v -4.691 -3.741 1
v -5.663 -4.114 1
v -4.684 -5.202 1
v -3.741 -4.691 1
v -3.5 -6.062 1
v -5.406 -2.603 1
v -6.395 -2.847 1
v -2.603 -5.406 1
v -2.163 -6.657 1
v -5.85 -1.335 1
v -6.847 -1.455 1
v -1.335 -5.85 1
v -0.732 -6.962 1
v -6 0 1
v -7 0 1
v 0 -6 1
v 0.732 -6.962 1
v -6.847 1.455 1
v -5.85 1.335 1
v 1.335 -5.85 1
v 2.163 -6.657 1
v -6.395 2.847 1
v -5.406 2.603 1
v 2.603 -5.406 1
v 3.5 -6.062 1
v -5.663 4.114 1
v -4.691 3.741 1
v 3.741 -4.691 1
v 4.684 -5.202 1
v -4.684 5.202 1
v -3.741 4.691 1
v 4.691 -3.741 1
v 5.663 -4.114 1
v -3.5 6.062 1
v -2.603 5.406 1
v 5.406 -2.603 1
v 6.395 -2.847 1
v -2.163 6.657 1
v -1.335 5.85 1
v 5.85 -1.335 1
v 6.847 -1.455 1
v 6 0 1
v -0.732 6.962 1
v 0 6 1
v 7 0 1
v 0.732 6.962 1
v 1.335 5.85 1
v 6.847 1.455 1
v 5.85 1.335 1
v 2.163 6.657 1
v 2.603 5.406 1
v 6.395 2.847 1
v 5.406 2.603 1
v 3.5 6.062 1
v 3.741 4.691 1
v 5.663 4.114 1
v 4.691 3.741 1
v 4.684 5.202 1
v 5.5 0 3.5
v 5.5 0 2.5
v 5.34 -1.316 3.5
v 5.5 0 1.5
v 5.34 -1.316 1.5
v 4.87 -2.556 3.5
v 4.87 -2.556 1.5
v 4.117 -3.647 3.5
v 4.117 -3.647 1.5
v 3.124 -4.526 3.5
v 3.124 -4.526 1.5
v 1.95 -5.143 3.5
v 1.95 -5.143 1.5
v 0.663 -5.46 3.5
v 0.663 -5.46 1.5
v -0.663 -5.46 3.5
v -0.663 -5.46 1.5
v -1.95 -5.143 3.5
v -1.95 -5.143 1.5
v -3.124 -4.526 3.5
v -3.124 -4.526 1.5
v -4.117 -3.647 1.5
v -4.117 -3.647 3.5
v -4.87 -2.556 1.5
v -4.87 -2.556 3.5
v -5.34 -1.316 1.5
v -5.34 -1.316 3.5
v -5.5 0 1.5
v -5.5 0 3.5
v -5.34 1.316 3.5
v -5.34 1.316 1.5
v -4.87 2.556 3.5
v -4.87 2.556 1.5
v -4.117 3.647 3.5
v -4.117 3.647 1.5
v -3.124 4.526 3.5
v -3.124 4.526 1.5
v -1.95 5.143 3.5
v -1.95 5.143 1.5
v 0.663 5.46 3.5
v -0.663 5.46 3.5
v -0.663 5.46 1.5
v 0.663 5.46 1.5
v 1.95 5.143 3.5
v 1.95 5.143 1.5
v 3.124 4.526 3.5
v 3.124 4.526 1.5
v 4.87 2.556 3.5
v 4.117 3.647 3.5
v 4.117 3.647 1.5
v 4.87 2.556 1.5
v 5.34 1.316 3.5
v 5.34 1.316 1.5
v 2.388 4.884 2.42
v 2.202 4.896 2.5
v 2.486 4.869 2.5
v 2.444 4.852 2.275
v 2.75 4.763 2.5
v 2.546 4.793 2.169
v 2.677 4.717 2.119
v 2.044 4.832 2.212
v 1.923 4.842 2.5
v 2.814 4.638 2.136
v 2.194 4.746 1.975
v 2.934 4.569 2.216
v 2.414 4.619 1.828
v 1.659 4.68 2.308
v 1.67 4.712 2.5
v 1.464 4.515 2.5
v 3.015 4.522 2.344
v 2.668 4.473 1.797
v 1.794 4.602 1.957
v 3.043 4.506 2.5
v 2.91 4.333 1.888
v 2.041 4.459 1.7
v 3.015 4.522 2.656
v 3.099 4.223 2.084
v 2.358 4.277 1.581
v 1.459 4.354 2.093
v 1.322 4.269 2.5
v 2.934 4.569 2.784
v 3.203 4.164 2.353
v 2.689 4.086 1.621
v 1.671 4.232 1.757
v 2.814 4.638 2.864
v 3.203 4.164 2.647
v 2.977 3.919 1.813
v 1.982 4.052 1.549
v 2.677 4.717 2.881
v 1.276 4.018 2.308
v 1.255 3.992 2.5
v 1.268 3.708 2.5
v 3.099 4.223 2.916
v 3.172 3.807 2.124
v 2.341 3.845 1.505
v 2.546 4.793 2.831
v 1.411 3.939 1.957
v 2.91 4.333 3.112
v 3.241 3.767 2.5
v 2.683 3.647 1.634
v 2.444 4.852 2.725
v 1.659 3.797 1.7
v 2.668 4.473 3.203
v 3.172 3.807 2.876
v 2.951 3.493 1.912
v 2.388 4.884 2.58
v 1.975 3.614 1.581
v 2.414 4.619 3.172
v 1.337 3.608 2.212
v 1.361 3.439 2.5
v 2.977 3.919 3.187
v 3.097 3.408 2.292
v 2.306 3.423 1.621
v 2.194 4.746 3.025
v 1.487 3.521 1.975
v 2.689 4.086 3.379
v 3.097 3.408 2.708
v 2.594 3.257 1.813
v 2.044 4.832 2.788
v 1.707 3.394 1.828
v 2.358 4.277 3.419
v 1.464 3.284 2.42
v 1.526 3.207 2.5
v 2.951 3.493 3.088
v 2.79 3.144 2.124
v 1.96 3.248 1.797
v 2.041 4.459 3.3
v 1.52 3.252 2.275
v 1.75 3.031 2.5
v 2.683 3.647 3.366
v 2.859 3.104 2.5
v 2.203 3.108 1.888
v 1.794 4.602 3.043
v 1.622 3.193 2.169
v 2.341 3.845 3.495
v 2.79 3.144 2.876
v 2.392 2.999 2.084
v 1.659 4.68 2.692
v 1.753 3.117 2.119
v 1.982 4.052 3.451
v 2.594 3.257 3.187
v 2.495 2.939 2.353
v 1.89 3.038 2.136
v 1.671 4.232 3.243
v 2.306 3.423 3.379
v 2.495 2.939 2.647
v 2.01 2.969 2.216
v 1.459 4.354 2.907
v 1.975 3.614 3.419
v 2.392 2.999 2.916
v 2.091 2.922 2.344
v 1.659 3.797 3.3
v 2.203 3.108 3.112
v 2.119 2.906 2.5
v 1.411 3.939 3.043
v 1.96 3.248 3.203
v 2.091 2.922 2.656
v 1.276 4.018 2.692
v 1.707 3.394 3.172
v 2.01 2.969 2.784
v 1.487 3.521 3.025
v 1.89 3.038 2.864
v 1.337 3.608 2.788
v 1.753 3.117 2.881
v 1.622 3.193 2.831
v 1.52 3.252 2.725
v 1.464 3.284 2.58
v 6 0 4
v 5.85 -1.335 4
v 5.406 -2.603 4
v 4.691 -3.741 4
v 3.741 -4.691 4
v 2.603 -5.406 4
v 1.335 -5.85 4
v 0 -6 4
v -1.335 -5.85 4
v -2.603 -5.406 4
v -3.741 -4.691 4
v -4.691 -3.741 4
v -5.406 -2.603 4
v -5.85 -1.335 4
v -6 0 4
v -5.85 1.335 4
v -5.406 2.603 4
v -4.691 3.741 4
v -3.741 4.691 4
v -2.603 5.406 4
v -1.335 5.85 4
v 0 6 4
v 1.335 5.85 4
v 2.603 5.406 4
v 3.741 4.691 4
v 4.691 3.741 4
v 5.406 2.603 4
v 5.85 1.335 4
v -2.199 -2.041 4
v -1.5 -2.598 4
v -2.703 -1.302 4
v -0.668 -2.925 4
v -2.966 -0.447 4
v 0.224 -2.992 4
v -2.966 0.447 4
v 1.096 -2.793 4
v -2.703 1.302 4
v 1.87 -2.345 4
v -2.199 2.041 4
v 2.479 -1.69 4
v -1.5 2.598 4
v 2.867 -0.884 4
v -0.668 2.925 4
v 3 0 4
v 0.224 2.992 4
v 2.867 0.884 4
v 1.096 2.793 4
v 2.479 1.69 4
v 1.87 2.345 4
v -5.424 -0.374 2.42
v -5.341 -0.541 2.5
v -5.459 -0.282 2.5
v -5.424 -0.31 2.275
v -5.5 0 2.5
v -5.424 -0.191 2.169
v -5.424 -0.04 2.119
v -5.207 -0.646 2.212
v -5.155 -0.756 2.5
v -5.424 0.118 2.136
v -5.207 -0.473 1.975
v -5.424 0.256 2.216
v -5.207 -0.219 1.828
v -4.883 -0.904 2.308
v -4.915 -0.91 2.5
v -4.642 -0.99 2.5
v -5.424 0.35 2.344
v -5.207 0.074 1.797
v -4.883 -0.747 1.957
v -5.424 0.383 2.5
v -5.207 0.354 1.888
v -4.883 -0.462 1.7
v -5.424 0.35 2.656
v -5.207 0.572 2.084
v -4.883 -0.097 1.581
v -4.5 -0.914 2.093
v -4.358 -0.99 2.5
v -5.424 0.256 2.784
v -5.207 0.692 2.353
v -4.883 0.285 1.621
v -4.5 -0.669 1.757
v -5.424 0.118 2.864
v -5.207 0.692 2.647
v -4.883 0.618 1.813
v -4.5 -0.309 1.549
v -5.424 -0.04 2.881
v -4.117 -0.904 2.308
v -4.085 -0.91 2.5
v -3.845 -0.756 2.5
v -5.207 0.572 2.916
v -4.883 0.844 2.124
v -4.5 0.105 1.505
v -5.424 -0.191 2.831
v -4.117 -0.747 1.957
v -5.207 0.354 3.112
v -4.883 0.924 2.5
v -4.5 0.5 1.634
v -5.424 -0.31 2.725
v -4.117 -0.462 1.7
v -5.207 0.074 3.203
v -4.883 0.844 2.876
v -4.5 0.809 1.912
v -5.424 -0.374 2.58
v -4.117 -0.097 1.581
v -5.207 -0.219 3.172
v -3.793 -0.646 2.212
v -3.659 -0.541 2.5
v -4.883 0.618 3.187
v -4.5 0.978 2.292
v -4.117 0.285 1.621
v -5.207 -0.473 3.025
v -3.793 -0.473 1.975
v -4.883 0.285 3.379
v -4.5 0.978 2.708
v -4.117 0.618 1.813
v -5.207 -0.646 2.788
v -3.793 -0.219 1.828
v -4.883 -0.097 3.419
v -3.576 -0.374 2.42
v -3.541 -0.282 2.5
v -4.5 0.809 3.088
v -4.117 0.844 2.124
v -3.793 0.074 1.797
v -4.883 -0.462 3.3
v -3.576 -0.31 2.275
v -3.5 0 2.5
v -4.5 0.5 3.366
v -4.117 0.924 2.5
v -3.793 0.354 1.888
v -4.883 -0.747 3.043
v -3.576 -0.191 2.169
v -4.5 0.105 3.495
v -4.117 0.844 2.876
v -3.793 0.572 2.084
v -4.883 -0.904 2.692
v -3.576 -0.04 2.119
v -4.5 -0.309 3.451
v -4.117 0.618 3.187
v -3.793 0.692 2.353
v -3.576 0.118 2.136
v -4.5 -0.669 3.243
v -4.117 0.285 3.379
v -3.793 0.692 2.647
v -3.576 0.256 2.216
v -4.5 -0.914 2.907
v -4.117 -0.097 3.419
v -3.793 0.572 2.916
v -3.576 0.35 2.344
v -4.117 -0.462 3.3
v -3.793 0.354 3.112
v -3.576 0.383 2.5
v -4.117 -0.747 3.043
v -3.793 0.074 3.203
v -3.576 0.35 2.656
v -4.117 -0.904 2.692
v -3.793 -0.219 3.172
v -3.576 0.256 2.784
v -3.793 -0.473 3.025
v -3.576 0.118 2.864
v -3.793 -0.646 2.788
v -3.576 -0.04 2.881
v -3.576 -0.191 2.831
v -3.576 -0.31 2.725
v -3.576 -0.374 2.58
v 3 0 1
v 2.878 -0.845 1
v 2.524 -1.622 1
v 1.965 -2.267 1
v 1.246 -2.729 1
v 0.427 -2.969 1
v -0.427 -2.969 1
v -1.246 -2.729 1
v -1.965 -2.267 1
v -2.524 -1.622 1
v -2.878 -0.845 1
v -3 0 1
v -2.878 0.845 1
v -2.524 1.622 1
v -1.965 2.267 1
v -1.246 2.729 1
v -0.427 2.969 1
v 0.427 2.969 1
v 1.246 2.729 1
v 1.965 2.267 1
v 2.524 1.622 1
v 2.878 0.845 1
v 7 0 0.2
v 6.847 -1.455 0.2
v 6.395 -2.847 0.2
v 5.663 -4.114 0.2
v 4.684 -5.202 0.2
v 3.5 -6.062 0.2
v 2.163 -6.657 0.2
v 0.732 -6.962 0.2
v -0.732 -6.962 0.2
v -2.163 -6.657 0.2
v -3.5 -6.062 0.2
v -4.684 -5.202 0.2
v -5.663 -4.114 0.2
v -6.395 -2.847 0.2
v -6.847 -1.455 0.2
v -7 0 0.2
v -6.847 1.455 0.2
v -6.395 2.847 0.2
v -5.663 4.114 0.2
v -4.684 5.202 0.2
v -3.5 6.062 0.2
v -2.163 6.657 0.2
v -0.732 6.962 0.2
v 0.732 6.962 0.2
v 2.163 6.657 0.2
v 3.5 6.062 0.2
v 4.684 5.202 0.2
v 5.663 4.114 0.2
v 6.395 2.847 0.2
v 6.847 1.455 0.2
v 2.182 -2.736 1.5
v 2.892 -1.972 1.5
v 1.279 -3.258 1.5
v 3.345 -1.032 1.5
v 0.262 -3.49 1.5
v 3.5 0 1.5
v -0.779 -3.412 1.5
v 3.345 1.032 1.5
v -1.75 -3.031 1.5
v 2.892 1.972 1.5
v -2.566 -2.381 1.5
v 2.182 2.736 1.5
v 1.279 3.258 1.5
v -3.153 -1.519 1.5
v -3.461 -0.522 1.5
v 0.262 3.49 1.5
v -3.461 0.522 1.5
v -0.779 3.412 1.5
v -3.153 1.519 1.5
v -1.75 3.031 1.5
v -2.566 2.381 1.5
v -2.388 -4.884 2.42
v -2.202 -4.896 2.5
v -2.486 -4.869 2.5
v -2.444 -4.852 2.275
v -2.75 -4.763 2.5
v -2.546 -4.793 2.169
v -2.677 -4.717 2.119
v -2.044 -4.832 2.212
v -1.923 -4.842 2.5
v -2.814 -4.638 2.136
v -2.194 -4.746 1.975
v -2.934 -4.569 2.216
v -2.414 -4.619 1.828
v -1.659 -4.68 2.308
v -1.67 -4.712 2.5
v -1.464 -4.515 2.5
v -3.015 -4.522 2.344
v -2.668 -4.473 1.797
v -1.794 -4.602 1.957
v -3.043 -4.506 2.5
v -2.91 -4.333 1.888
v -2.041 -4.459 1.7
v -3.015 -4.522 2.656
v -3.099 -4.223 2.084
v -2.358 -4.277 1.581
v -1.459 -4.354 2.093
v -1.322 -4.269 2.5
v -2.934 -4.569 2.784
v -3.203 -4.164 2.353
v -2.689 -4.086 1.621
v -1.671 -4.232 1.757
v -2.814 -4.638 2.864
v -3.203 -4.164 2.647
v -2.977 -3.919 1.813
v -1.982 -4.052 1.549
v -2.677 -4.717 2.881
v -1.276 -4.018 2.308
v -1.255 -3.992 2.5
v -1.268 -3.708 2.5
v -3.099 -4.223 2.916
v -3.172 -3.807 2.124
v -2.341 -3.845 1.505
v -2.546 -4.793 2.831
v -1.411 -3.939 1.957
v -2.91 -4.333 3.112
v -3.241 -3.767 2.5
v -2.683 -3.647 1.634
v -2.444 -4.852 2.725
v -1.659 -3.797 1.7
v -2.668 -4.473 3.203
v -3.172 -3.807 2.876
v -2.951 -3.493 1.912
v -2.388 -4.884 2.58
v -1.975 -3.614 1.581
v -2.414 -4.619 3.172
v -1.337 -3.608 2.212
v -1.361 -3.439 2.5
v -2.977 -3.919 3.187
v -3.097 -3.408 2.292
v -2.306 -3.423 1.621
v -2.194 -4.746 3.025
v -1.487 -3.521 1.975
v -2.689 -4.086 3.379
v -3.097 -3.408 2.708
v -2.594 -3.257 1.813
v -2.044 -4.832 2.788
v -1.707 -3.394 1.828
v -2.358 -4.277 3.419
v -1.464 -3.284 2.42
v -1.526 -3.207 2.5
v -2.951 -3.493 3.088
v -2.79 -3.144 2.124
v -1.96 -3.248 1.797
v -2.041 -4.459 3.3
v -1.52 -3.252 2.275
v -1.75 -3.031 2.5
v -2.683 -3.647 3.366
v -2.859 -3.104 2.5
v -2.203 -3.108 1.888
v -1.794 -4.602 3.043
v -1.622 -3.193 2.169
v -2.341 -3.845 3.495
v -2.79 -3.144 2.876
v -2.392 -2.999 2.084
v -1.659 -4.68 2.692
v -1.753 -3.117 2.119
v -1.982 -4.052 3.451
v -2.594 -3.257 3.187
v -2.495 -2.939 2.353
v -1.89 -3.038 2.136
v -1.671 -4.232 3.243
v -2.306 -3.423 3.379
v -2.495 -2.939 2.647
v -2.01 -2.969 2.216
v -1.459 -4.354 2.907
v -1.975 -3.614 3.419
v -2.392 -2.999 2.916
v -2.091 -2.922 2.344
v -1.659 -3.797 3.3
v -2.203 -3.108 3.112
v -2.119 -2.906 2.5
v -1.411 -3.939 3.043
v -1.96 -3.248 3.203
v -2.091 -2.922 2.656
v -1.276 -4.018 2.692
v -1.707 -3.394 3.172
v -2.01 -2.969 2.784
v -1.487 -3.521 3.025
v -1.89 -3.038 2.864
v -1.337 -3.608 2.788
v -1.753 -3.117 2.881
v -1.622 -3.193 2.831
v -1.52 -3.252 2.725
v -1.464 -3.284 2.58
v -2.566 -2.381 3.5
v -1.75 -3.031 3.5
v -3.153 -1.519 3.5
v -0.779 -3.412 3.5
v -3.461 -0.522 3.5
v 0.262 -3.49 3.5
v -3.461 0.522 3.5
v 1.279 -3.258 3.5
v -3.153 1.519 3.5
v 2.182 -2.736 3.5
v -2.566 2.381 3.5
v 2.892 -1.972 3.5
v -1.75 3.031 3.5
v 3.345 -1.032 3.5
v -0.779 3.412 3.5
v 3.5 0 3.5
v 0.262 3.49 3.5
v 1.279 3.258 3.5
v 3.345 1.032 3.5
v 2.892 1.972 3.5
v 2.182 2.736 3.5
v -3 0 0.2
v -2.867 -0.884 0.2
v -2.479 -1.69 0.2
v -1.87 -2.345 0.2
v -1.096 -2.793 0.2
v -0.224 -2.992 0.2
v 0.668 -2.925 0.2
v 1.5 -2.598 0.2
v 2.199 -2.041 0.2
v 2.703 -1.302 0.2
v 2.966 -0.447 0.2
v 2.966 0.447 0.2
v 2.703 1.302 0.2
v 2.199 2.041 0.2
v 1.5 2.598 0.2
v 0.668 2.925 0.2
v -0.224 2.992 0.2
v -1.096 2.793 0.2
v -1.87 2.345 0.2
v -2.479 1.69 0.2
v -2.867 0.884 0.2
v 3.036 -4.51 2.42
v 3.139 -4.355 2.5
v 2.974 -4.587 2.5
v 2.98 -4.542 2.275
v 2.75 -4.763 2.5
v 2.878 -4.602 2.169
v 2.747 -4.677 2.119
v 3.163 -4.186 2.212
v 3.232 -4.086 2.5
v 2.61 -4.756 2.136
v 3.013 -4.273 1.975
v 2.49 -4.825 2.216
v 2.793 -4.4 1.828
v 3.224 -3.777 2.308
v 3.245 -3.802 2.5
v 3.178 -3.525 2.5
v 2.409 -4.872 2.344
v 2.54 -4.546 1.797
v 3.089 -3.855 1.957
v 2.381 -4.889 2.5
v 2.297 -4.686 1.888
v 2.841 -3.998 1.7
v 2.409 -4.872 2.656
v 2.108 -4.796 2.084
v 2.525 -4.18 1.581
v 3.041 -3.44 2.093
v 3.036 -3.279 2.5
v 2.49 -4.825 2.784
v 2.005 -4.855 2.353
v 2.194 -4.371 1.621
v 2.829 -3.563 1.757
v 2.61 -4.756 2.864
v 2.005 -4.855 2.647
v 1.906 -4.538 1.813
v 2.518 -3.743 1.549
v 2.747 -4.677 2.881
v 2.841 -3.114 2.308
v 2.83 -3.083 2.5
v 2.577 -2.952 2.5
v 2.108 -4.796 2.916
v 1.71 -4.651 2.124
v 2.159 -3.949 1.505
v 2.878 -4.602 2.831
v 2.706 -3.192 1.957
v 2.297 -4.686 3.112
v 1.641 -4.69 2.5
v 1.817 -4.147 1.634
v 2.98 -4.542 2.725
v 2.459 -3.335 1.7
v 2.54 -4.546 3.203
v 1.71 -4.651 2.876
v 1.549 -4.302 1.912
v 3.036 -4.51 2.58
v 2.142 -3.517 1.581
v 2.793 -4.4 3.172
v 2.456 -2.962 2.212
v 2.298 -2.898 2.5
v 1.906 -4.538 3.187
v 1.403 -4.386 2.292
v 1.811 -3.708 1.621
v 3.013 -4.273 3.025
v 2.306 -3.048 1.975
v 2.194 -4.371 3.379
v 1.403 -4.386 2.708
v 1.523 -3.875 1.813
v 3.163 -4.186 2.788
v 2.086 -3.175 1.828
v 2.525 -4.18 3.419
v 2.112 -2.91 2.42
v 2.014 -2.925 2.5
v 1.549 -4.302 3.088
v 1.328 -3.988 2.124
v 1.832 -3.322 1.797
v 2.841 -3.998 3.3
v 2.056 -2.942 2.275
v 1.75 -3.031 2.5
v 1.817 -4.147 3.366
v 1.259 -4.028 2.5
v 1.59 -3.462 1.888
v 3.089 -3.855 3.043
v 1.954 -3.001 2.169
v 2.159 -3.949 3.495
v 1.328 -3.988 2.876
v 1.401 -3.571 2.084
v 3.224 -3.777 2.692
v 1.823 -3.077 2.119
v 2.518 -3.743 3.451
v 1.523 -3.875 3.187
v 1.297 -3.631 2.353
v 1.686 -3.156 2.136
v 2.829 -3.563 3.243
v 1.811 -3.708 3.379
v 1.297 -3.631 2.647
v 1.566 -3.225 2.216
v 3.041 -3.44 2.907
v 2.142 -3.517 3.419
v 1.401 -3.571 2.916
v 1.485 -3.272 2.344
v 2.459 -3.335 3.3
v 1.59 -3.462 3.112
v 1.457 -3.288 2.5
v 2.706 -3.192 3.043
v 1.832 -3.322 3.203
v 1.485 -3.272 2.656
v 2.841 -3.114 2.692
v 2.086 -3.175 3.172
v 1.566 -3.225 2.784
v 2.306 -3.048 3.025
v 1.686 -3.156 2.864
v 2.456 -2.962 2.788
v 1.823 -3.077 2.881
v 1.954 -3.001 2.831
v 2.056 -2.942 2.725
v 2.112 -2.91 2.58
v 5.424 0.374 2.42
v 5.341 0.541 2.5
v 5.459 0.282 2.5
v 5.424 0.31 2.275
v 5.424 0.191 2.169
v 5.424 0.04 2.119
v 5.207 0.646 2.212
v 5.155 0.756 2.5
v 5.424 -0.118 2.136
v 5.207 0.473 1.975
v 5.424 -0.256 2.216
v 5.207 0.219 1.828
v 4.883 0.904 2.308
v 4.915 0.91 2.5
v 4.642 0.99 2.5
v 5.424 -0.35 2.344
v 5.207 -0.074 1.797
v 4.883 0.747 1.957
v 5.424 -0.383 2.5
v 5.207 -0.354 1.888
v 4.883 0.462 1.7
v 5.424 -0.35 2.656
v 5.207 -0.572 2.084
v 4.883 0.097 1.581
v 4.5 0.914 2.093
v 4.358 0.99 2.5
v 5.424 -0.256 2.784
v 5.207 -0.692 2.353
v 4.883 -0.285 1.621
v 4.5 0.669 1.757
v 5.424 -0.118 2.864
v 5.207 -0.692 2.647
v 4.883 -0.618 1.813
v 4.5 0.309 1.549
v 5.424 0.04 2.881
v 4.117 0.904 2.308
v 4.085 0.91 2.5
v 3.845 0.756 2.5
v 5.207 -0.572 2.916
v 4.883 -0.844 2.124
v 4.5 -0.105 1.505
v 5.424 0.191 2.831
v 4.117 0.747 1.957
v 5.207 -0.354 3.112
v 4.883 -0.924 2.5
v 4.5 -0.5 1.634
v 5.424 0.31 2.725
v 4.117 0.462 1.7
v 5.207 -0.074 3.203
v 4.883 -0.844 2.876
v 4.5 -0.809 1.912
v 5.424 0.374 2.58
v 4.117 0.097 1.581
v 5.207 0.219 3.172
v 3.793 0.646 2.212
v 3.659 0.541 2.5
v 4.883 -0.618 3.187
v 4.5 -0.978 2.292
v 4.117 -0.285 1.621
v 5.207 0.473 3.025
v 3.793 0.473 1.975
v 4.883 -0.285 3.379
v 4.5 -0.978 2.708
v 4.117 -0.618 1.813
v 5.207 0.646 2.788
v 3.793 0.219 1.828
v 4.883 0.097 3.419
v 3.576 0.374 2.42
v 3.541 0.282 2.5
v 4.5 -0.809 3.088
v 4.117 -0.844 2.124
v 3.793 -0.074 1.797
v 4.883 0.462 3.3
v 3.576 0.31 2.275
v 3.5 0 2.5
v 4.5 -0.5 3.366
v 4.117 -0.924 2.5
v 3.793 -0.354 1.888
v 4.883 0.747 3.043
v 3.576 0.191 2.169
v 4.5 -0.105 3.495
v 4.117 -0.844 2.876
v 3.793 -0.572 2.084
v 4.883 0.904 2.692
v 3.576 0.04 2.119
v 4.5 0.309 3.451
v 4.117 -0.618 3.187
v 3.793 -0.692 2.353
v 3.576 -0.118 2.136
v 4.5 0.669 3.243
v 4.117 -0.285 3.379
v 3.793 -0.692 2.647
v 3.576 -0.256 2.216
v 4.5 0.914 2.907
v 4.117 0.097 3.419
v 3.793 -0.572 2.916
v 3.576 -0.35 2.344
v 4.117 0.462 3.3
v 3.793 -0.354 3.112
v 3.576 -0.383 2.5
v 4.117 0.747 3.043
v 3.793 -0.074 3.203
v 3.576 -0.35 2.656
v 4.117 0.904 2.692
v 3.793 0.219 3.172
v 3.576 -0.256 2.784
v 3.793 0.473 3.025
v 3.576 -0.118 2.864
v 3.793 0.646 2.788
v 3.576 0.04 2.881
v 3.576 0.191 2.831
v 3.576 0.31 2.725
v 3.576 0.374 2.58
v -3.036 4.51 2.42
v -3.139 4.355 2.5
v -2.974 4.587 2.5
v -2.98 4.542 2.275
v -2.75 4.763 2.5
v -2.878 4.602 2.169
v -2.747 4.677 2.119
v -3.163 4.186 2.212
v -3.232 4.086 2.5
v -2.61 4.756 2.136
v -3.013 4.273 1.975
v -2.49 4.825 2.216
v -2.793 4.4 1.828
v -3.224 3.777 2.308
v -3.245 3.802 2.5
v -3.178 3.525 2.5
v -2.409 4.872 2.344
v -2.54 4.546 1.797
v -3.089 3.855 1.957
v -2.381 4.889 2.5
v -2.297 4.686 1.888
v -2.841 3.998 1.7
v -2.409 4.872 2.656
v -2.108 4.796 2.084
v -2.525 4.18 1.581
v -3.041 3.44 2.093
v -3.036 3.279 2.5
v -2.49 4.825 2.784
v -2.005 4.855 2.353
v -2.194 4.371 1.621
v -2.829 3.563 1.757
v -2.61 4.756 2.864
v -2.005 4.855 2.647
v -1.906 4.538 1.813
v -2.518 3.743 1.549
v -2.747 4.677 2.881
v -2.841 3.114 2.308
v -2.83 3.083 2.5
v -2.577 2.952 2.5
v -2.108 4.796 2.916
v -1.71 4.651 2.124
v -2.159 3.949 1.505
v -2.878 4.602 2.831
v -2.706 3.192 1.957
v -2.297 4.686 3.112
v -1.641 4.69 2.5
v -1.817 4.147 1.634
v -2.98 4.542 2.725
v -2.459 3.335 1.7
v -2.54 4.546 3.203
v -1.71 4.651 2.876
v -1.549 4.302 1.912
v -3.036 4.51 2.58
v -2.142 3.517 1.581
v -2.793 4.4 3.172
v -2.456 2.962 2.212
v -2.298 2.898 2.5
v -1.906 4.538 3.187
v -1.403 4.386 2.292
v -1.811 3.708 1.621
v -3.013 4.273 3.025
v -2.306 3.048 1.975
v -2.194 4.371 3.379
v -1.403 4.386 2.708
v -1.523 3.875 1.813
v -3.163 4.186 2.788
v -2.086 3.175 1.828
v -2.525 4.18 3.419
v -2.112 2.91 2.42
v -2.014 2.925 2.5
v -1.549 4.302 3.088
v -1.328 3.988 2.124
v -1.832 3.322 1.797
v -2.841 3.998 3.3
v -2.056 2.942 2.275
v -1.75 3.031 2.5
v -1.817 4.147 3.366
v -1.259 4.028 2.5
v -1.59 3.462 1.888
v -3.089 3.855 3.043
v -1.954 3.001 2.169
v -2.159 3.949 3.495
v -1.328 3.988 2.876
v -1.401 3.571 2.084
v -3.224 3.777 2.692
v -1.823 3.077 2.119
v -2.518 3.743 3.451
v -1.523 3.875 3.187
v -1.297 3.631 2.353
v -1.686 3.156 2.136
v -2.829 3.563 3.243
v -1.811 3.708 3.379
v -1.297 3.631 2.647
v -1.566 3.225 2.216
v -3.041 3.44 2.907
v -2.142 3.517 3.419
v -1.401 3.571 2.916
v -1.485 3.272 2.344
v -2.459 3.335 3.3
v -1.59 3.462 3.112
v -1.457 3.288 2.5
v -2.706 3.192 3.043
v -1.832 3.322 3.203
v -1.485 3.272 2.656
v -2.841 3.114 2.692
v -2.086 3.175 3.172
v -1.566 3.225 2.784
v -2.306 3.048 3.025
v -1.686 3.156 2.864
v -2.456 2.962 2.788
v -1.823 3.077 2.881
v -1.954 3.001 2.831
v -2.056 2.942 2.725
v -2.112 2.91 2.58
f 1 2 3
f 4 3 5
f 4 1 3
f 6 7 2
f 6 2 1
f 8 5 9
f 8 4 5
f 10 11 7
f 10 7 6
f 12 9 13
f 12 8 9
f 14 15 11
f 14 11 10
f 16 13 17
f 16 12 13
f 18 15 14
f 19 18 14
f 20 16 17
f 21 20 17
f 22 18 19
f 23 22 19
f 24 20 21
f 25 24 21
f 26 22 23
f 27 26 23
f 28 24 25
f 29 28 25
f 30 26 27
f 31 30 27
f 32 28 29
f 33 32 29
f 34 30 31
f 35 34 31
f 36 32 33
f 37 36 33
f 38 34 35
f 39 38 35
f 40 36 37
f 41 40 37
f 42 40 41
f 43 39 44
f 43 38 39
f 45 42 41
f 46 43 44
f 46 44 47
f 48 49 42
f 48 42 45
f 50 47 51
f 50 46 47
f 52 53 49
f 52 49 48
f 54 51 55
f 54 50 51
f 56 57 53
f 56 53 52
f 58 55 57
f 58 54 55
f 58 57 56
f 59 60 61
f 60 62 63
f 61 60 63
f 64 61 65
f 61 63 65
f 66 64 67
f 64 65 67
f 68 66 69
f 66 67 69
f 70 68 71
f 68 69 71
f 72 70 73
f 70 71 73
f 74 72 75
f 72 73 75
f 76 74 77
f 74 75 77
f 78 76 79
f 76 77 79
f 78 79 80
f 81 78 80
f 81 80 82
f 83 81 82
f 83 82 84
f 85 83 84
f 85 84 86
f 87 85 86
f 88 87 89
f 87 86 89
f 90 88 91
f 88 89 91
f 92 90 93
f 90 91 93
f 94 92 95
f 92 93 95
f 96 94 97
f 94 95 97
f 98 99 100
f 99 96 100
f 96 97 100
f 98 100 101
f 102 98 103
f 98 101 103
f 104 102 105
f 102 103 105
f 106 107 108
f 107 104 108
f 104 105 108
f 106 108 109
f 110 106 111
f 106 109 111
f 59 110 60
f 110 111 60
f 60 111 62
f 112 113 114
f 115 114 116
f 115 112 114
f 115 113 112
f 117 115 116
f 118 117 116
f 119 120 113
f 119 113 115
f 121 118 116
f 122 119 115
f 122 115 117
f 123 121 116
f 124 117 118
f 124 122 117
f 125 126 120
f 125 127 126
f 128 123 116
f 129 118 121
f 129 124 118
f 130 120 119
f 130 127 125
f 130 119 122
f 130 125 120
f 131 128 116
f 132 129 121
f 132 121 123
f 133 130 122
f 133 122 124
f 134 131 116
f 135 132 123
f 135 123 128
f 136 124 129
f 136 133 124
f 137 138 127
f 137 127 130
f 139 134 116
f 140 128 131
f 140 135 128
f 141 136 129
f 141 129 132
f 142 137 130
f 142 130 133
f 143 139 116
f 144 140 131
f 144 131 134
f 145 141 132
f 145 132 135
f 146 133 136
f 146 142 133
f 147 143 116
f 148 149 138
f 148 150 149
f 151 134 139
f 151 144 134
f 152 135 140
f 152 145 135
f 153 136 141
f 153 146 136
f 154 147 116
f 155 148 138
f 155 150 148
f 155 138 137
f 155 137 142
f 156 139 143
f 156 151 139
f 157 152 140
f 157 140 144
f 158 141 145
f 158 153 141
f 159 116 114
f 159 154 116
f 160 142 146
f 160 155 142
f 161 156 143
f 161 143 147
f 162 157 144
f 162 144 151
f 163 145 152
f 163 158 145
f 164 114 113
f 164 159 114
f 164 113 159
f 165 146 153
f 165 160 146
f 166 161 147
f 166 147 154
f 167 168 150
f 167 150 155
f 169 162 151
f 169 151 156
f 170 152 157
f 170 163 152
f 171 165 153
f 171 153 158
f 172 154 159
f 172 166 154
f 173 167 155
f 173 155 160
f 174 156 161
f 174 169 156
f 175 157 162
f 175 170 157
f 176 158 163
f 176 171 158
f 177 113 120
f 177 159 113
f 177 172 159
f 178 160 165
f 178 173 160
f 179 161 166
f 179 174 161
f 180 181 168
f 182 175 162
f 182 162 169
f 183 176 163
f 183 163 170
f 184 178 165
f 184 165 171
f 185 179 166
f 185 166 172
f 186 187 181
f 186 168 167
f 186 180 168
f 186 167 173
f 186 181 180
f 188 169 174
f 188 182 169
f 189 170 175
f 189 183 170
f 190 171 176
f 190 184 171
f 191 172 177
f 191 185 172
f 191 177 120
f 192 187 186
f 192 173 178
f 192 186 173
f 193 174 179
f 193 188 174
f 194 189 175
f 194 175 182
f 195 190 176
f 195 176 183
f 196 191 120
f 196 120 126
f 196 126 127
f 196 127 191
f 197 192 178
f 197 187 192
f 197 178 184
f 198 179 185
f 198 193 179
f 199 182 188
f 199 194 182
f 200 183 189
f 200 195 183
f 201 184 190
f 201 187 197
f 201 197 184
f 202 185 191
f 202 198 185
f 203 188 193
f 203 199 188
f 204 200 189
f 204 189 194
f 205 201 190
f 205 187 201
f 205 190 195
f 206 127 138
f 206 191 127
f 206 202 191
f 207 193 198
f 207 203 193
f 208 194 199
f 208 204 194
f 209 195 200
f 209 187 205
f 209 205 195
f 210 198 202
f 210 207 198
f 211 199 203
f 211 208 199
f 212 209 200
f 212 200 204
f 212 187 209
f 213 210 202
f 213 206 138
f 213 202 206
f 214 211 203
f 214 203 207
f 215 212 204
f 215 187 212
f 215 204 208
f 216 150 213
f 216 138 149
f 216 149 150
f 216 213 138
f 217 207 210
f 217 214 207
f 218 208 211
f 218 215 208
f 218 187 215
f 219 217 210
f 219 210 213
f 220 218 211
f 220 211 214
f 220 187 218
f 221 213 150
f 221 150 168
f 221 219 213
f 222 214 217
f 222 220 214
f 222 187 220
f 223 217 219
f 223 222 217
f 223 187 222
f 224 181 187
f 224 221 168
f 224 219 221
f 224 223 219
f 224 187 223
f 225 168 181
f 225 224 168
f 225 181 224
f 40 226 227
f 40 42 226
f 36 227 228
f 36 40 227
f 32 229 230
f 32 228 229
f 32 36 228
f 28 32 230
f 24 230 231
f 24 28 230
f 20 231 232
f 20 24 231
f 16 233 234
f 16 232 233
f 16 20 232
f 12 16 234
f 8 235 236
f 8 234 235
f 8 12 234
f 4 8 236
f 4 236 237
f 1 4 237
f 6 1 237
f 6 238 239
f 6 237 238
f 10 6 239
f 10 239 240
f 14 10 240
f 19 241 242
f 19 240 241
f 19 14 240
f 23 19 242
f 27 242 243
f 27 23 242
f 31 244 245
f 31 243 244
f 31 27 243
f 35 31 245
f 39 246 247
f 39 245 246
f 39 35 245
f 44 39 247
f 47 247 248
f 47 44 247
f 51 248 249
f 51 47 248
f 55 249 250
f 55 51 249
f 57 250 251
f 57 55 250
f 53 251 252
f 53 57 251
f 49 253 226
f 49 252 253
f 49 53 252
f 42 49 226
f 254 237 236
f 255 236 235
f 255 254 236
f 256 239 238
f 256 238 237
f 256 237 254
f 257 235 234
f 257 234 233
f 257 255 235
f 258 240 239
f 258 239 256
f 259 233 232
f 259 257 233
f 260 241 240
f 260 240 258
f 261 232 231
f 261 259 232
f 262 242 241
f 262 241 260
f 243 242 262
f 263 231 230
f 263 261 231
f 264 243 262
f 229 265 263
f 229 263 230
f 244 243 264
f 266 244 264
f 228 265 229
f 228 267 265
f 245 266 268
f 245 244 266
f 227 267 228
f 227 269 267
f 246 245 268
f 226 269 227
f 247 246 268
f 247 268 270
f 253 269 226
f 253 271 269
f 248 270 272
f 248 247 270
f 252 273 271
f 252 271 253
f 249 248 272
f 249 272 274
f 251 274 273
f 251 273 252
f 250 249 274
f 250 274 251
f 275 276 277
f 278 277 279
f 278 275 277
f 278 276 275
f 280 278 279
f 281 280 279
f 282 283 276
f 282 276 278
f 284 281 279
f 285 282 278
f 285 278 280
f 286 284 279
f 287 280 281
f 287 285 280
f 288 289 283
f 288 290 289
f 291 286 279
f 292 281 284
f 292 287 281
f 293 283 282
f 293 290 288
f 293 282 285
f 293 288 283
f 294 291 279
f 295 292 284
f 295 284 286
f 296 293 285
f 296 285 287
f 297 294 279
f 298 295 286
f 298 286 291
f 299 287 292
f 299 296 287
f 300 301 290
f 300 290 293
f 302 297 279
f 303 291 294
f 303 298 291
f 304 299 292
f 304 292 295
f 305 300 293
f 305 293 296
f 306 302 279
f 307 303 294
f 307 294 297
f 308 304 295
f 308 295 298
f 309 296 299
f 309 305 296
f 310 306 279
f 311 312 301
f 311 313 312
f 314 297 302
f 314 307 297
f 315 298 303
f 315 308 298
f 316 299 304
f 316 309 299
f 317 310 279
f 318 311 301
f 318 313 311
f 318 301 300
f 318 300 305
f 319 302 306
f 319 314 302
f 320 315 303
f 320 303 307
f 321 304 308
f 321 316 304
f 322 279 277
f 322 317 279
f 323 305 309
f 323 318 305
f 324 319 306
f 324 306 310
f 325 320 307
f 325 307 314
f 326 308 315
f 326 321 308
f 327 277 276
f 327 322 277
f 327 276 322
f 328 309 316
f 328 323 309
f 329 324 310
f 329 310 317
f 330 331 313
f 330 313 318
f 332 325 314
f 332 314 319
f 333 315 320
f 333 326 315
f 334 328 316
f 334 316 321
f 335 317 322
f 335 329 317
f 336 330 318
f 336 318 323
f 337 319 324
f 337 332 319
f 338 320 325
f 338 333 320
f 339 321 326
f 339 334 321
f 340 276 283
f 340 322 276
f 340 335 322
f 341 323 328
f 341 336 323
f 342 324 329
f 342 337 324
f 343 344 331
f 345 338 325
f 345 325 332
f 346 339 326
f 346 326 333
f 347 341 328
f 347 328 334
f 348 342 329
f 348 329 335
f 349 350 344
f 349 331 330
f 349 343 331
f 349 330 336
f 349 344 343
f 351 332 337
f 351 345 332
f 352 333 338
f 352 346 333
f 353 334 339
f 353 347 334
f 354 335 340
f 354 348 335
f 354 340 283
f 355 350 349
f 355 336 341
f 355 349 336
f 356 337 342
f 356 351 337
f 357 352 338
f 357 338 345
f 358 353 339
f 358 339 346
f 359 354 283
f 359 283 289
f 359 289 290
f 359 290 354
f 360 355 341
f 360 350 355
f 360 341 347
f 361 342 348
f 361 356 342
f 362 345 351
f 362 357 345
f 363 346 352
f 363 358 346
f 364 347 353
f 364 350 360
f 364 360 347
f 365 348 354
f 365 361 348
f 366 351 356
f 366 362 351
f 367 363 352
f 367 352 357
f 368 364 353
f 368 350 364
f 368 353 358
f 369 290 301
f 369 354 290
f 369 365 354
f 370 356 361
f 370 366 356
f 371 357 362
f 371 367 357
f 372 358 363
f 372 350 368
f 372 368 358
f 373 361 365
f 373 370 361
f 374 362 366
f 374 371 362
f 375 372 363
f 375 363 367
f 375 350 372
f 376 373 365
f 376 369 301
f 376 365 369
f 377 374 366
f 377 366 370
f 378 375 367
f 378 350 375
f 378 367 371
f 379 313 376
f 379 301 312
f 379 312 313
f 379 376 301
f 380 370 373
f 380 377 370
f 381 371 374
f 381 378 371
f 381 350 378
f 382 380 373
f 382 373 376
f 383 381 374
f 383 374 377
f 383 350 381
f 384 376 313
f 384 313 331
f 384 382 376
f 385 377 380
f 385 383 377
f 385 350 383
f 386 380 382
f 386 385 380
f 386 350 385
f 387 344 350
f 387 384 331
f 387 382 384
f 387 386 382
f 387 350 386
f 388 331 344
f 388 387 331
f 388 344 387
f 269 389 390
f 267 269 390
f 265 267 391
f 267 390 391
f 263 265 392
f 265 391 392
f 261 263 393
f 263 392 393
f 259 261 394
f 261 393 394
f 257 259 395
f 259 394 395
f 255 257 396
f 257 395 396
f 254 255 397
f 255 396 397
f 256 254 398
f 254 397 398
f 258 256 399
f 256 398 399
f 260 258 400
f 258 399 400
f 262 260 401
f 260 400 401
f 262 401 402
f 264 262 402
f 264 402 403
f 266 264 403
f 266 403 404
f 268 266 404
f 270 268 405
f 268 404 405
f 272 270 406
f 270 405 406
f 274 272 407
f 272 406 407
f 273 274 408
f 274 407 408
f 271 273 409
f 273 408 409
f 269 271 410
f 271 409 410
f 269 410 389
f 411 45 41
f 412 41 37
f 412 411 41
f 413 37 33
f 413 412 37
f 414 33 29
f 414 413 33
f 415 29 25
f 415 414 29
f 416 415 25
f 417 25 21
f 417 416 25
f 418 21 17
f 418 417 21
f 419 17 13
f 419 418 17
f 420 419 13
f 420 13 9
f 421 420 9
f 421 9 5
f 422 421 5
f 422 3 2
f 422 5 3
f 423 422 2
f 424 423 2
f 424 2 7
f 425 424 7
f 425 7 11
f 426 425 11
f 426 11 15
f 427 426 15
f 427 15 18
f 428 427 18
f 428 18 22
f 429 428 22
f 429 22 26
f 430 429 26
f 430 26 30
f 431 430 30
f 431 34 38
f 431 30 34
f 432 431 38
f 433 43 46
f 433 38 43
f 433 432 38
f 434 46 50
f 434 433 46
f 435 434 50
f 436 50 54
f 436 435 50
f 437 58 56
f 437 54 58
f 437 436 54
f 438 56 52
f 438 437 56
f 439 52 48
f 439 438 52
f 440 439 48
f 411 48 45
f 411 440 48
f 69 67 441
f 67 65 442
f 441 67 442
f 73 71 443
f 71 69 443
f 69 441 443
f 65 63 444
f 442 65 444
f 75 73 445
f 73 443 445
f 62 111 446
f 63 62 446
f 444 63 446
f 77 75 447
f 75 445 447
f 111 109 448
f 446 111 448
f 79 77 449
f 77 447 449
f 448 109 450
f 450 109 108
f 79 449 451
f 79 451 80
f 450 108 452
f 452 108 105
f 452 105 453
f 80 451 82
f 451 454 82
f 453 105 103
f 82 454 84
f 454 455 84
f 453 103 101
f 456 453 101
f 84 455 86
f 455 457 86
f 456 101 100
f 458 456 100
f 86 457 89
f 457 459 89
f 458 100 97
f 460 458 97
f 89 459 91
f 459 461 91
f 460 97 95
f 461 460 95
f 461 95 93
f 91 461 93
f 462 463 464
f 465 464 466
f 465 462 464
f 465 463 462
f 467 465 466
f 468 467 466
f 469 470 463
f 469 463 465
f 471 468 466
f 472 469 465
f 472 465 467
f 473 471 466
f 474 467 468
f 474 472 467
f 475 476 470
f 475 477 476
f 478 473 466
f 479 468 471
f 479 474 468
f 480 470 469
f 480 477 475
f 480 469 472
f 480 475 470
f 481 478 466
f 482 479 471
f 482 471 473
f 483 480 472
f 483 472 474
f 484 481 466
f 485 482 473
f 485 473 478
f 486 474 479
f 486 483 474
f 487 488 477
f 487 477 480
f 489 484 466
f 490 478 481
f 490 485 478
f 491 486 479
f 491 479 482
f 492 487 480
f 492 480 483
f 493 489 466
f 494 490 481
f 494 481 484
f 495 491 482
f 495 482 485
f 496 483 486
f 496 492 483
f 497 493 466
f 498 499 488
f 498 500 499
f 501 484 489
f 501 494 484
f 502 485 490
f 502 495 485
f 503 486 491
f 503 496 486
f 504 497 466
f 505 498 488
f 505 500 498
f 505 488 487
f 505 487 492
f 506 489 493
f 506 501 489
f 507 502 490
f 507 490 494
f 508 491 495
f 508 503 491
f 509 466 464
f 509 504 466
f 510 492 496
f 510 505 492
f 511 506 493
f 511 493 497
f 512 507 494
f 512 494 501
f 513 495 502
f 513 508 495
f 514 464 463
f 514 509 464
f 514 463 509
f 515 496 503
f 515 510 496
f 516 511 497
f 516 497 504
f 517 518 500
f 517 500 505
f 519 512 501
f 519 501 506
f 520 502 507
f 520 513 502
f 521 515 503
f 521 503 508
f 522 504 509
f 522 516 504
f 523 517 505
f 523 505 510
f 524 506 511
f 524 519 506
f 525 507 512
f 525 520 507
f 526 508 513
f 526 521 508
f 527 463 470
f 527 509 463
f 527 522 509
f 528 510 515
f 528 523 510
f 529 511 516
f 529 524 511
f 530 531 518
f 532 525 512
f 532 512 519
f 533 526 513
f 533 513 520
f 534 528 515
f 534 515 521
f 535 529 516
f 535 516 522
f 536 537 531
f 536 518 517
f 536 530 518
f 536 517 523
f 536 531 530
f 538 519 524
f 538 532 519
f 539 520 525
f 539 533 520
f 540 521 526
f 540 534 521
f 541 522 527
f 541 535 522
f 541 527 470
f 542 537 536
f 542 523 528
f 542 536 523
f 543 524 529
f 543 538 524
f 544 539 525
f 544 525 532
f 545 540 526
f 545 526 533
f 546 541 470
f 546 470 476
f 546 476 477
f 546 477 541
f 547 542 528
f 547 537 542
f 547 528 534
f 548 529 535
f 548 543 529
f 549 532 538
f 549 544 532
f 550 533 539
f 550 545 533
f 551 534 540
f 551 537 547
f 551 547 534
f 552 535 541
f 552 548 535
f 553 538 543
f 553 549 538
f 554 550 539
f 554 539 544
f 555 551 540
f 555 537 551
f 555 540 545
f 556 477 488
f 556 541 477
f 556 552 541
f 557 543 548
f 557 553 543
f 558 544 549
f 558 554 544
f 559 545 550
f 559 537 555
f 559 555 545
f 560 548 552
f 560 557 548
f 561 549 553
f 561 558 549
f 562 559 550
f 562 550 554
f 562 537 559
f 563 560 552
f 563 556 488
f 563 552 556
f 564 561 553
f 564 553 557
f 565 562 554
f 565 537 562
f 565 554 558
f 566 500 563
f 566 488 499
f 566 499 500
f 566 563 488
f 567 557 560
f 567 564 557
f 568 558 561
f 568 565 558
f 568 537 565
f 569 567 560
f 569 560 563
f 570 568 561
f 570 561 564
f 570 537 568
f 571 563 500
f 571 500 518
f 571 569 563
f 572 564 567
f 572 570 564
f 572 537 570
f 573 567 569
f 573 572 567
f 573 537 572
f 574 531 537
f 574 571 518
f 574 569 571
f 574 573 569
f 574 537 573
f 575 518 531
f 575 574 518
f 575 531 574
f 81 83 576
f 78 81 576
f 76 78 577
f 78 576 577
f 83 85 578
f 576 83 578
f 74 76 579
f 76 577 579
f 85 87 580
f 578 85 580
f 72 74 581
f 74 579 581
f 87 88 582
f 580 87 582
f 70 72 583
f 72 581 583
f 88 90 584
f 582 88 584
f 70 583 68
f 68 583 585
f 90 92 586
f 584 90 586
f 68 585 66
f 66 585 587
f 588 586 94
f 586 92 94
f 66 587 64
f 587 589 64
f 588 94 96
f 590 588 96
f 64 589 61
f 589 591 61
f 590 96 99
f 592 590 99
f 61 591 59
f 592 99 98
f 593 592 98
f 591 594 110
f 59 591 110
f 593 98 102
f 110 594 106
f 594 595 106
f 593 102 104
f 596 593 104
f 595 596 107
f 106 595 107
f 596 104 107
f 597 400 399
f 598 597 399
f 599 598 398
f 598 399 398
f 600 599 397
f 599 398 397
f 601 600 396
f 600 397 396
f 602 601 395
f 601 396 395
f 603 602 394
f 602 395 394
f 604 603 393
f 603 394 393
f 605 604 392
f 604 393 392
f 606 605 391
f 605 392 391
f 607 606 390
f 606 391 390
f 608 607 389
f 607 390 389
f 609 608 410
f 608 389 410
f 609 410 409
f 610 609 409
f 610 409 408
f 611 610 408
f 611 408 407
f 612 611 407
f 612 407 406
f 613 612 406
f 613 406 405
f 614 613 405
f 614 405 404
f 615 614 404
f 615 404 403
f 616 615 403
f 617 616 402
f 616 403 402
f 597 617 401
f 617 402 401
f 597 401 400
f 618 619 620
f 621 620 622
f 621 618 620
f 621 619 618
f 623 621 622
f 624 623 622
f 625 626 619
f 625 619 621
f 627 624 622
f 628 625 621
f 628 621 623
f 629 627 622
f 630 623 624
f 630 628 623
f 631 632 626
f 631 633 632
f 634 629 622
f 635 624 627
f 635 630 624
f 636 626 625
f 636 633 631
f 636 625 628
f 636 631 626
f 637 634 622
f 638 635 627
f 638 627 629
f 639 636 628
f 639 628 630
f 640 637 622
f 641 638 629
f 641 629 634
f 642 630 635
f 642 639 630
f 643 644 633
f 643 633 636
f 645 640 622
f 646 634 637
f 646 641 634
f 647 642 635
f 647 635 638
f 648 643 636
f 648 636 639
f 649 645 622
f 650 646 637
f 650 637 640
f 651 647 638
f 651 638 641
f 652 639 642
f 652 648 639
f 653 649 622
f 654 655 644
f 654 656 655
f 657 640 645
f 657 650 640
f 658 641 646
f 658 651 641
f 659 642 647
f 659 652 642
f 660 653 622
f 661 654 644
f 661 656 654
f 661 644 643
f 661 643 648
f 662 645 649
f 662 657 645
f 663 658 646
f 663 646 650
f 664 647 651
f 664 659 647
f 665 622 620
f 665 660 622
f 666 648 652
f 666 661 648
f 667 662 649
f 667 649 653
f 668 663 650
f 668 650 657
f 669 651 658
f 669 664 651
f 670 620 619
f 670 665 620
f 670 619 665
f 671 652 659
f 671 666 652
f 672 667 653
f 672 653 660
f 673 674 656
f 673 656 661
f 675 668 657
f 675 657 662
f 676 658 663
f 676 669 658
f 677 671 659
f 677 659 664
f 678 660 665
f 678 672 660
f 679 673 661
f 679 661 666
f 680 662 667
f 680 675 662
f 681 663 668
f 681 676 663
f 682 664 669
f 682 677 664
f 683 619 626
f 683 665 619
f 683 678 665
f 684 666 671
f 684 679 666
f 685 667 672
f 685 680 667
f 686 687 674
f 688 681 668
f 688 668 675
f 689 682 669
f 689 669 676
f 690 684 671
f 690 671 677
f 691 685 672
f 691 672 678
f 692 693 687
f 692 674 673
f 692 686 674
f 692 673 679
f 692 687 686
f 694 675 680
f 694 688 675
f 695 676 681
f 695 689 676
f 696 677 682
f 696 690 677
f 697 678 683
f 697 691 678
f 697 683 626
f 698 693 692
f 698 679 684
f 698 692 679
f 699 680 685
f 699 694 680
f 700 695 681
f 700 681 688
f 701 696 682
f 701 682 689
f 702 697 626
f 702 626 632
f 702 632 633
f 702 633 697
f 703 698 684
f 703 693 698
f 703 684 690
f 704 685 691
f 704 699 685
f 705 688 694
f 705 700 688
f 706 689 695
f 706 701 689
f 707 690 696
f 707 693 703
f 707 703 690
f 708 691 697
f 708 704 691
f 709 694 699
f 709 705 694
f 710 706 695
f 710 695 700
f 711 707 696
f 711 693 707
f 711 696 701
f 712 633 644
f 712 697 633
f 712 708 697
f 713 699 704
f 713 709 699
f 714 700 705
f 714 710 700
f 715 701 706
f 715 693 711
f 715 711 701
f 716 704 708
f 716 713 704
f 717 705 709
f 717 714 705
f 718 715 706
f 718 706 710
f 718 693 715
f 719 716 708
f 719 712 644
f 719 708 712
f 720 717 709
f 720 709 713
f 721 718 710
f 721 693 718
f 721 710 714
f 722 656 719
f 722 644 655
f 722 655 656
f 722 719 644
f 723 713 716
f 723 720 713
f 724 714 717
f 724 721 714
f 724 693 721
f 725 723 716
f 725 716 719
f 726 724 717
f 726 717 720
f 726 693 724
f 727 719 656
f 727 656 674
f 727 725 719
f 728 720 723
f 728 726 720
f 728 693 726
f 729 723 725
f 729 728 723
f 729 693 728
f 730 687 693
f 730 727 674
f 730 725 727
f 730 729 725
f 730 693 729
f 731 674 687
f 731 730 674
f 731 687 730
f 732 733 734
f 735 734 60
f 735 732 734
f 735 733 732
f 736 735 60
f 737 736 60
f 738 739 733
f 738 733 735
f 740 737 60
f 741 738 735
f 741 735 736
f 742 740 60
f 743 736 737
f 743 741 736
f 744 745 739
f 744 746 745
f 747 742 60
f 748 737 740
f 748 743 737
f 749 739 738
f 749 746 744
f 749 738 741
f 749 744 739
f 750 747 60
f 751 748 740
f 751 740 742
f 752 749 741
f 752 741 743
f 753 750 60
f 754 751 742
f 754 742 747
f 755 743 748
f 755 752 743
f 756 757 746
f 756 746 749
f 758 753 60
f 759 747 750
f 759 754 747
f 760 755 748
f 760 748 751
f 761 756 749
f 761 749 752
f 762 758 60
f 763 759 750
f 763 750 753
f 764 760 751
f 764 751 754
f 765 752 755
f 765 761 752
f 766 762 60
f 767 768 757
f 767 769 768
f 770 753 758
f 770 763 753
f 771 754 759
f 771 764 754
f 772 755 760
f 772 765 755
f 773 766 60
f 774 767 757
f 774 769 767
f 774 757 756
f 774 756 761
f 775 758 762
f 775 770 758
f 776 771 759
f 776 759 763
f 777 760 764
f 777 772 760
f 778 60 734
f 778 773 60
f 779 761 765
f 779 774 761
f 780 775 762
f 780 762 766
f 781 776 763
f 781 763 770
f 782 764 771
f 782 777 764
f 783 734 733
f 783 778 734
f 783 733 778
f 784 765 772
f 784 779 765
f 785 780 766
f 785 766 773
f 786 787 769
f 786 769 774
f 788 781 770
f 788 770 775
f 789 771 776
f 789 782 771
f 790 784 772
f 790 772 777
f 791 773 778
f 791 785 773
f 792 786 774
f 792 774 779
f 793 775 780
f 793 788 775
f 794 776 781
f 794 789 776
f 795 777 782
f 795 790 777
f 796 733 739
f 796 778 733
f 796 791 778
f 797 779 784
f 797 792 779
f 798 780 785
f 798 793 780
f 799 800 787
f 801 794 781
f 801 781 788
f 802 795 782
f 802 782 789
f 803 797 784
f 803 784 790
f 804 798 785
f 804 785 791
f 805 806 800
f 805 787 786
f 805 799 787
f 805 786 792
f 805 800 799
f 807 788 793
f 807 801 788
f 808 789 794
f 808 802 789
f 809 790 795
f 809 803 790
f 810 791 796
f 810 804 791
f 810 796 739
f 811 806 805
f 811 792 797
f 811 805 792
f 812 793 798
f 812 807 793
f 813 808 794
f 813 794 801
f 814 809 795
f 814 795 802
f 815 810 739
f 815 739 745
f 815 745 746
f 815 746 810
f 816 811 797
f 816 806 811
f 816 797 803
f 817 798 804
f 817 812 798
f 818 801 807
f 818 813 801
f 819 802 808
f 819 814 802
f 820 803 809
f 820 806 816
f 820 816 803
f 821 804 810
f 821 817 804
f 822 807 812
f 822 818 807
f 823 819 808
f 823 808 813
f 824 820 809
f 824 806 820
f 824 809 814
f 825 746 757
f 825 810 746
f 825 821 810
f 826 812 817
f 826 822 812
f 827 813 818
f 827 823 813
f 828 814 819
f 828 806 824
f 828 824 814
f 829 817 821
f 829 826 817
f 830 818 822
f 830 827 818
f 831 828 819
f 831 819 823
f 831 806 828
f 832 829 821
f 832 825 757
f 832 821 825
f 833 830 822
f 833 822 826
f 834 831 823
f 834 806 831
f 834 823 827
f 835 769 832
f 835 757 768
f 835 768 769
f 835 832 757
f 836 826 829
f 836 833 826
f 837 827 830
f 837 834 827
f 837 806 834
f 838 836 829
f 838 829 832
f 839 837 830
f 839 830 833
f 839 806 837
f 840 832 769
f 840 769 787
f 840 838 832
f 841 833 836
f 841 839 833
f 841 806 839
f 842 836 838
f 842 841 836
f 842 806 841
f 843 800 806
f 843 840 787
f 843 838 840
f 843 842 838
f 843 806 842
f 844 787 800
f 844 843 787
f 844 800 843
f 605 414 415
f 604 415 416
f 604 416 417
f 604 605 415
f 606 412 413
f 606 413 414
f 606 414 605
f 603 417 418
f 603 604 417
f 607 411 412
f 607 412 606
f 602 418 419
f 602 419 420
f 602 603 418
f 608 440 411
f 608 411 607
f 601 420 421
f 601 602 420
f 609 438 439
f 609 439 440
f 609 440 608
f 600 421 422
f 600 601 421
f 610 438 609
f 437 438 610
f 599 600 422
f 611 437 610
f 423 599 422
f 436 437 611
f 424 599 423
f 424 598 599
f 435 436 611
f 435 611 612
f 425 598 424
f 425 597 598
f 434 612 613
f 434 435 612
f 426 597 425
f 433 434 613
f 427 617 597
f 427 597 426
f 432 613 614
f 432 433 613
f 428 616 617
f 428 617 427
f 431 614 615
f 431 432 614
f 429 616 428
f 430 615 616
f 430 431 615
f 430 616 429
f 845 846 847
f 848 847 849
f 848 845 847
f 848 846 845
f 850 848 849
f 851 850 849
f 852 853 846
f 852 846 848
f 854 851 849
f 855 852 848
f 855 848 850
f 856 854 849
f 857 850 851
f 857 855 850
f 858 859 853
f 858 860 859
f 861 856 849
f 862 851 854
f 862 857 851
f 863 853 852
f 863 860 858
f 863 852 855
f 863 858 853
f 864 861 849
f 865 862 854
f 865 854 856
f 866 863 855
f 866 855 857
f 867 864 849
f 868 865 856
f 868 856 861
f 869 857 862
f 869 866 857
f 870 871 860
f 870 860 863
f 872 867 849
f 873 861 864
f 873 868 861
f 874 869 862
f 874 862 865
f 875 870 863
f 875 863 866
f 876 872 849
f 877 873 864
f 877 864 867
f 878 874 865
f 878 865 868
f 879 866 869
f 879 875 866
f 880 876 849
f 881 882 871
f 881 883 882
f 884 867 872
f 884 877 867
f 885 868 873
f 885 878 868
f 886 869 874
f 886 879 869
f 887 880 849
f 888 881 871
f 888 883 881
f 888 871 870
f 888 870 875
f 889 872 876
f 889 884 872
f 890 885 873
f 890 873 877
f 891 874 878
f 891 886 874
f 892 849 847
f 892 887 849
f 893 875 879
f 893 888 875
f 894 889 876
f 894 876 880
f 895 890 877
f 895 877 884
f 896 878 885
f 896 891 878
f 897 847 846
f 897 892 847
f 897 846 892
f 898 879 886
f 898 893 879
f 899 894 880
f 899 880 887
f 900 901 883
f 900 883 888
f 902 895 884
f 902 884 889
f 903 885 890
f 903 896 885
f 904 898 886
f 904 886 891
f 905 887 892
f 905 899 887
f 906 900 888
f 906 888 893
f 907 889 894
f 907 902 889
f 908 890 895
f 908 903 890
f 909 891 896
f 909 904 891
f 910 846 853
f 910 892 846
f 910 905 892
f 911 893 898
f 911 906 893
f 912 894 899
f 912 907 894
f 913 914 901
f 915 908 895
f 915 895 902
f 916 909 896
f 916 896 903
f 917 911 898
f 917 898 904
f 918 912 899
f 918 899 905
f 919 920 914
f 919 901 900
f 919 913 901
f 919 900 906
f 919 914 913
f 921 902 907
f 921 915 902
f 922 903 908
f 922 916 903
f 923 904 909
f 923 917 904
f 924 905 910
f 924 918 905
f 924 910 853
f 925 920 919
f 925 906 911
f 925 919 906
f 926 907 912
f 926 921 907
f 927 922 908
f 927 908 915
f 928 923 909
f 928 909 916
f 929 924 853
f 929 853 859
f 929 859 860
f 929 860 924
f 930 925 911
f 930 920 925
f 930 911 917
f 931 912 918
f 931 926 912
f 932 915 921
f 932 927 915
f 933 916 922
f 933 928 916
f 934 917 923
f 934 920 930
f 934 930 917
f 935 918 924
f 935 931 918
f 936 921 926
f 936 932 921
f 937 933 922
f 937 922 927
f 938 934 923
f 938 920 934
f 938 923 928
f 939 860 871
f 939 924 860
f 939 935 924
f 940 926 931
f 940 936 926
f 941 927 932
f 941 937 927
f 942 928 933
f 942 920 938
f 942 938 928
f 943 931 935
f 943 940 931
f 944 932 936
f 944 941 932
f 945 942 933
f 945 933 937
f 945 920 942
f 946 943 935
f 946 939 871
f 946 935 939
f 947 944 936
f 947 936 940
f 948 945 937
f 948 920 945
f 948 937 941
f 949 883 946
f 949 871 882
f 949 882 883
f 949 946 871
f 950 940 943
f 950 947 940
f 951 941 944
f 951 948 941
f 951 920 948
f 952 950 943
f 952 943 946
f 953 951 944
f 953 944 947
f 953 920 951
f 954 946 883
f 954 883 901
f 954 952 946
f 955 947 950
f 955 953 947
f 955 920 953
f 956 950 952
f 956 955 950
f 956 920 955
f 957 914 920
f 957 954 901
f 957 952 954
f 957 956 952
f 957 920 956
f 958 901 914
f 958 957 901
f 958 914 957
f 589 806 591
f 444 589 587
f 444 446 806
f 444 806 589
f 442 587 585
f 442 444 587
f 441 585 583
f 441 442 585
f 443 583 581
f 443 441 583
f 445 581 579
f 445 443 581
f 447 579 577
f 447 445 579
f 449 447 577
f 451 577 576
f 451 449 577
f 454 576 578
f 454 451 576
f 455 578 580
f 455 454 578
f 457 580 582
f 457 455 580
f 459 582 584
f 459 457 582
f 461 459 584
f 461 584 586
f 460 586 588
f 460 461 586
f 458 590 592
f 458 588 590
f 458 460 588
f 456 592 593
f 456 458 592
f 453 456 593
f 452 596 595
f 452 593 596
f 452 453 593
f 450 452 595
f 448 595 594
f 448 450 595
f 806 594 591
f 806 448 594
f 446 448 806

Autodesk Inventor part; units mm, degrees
sketch "スケッチ1" plane through (0, 0, 0) normal (0, 0, 1) x (1, 0, 0)
  circle A0 centre (0, 0) radius 7
  circle A1 centre (0, 0) radius 6
  dimension "d0" = 14
  dimension "d1" = 12
extrude "押し出し1" add sketch "スケッチ1" along normal blind 1
sketch "スケッチ2" plane through (0, 0, 1) normal (0, 0, 1) x (1, 0, 0)
  circle A0 centre (0, 0) radius 5.5
  circle A1 centre (0, 0) radius 3
  circle A2 centre (0, 0) radius 5
  circle A3 centre (0, 0) radius 3.5
  circle A4 centre (0, 0) radius 7 projected
  circle A5 centre (0, 0) radius 7 projected
  circle A6 centre (0, 0) radius 6 projected
  dimension "d4" = 11
  dimension "d5" = 6
  dimension "d6" = 10
  dimension "d7" = 7
extrude "押し出し2" add sketch "スケッチ2" along normal blind 3 contours A3 | A6
ref_plane "作業平面1" through (0, 0, 2.5) normal (0, 0, 1) x (1, 0, 0)
sketch "スケッチ3" plane through (0, 0, 2.5) normal (0, 0, 1) x (1, 0, 0)
  circle A0 centre (0, 0) radius 6 projected
  circle A1 centre (0, 0) radius 5.5 projected
  circle A2 centre (0, 0) radius 3.5 projected
  circle A3 centre (0, 0) radius 3 projected
  circle A4 centre (4.5, 0) radius 1
  circle A5 centre (0, 0) radius 5.5 projected
  circle A6 centre (0, 0) radius 3.5 projected
  circle A7 centre (0, 0) radius 5.5 projected
  line L0 (5.5, 0) -> (3.5, 0)
  circle A8 centre (0, 0) radius 3.5 projected
  dimension "d15" = 2
revolve "回転1" add sketch "スケッチ3" angle 360 about axis through (5.5, 0, 2.5) along (-1, 0, 0) picked at (4.7952, 0.1549) contours L0 A4
pattern_circular "円形状パターン1" count 6 over 360 about axis through (0, 0, -10) along (0, 0, 1) of "回転1"
ref_plane "作業平面2" through (0, 0, 3.5) normal (0, 0, 1) x (1, 0, 0)
ref_plane "作業平面3" through (0, 0, 1.5) normal (0, 0, -1) x (-1, 0, 0)
sketch "スケッチ4" plane through (0, 0, 1.5) normal (0, 0, -1) x (-1, 0, 0)
  circle A0 centre (0, 0) radius 3.5 projected
  circle A1 centre (0, 0) radius 3 projected
  circle A2 centre (0, 0) radius 6 projected
  circle A3 centre (0, 0) radius 5.5 projected
extrude "押し出し3" add sketch "スケッチ4" along normal blind 0.5 contours A3
sketch "スケッチ5" plane through (0, 0, 3.5) normal (0, 0, 1) x (1, 0, 0)
  circle A0 centre (0, 0) radius 5.5 projected
  circle A1 centre (0, 0) radius 3.5 projected
extrude "押し出し4" add sketch "スケッチ5" along normal blind 0.5
sketch "スケッチ6" plane through (0, 0, 1) normal (0, 0, -1) x (-1, 0, 0)
  circle A0 centre (0, 0) radius 6 projected
  circle A1 centre (0, 0) radius 3 projected
extrude "押し出し5" add sketch "スケッチ6" along normal blind 1
sketch "スケッチ7" plane through (0, 0, 0) normal (0, 0, -1) x (-1, 0, 0)
  circle A0 centre (0, 0) radius 3 projected
  circle A1 centre (0, 0) radius 7 projected
extrude "押し出し6" cut sketch "スケッチ7" against normal blind 0.2
properties part number "φ6φ12ベアリングa" material "鋼 AISI 1006 85 HR"
